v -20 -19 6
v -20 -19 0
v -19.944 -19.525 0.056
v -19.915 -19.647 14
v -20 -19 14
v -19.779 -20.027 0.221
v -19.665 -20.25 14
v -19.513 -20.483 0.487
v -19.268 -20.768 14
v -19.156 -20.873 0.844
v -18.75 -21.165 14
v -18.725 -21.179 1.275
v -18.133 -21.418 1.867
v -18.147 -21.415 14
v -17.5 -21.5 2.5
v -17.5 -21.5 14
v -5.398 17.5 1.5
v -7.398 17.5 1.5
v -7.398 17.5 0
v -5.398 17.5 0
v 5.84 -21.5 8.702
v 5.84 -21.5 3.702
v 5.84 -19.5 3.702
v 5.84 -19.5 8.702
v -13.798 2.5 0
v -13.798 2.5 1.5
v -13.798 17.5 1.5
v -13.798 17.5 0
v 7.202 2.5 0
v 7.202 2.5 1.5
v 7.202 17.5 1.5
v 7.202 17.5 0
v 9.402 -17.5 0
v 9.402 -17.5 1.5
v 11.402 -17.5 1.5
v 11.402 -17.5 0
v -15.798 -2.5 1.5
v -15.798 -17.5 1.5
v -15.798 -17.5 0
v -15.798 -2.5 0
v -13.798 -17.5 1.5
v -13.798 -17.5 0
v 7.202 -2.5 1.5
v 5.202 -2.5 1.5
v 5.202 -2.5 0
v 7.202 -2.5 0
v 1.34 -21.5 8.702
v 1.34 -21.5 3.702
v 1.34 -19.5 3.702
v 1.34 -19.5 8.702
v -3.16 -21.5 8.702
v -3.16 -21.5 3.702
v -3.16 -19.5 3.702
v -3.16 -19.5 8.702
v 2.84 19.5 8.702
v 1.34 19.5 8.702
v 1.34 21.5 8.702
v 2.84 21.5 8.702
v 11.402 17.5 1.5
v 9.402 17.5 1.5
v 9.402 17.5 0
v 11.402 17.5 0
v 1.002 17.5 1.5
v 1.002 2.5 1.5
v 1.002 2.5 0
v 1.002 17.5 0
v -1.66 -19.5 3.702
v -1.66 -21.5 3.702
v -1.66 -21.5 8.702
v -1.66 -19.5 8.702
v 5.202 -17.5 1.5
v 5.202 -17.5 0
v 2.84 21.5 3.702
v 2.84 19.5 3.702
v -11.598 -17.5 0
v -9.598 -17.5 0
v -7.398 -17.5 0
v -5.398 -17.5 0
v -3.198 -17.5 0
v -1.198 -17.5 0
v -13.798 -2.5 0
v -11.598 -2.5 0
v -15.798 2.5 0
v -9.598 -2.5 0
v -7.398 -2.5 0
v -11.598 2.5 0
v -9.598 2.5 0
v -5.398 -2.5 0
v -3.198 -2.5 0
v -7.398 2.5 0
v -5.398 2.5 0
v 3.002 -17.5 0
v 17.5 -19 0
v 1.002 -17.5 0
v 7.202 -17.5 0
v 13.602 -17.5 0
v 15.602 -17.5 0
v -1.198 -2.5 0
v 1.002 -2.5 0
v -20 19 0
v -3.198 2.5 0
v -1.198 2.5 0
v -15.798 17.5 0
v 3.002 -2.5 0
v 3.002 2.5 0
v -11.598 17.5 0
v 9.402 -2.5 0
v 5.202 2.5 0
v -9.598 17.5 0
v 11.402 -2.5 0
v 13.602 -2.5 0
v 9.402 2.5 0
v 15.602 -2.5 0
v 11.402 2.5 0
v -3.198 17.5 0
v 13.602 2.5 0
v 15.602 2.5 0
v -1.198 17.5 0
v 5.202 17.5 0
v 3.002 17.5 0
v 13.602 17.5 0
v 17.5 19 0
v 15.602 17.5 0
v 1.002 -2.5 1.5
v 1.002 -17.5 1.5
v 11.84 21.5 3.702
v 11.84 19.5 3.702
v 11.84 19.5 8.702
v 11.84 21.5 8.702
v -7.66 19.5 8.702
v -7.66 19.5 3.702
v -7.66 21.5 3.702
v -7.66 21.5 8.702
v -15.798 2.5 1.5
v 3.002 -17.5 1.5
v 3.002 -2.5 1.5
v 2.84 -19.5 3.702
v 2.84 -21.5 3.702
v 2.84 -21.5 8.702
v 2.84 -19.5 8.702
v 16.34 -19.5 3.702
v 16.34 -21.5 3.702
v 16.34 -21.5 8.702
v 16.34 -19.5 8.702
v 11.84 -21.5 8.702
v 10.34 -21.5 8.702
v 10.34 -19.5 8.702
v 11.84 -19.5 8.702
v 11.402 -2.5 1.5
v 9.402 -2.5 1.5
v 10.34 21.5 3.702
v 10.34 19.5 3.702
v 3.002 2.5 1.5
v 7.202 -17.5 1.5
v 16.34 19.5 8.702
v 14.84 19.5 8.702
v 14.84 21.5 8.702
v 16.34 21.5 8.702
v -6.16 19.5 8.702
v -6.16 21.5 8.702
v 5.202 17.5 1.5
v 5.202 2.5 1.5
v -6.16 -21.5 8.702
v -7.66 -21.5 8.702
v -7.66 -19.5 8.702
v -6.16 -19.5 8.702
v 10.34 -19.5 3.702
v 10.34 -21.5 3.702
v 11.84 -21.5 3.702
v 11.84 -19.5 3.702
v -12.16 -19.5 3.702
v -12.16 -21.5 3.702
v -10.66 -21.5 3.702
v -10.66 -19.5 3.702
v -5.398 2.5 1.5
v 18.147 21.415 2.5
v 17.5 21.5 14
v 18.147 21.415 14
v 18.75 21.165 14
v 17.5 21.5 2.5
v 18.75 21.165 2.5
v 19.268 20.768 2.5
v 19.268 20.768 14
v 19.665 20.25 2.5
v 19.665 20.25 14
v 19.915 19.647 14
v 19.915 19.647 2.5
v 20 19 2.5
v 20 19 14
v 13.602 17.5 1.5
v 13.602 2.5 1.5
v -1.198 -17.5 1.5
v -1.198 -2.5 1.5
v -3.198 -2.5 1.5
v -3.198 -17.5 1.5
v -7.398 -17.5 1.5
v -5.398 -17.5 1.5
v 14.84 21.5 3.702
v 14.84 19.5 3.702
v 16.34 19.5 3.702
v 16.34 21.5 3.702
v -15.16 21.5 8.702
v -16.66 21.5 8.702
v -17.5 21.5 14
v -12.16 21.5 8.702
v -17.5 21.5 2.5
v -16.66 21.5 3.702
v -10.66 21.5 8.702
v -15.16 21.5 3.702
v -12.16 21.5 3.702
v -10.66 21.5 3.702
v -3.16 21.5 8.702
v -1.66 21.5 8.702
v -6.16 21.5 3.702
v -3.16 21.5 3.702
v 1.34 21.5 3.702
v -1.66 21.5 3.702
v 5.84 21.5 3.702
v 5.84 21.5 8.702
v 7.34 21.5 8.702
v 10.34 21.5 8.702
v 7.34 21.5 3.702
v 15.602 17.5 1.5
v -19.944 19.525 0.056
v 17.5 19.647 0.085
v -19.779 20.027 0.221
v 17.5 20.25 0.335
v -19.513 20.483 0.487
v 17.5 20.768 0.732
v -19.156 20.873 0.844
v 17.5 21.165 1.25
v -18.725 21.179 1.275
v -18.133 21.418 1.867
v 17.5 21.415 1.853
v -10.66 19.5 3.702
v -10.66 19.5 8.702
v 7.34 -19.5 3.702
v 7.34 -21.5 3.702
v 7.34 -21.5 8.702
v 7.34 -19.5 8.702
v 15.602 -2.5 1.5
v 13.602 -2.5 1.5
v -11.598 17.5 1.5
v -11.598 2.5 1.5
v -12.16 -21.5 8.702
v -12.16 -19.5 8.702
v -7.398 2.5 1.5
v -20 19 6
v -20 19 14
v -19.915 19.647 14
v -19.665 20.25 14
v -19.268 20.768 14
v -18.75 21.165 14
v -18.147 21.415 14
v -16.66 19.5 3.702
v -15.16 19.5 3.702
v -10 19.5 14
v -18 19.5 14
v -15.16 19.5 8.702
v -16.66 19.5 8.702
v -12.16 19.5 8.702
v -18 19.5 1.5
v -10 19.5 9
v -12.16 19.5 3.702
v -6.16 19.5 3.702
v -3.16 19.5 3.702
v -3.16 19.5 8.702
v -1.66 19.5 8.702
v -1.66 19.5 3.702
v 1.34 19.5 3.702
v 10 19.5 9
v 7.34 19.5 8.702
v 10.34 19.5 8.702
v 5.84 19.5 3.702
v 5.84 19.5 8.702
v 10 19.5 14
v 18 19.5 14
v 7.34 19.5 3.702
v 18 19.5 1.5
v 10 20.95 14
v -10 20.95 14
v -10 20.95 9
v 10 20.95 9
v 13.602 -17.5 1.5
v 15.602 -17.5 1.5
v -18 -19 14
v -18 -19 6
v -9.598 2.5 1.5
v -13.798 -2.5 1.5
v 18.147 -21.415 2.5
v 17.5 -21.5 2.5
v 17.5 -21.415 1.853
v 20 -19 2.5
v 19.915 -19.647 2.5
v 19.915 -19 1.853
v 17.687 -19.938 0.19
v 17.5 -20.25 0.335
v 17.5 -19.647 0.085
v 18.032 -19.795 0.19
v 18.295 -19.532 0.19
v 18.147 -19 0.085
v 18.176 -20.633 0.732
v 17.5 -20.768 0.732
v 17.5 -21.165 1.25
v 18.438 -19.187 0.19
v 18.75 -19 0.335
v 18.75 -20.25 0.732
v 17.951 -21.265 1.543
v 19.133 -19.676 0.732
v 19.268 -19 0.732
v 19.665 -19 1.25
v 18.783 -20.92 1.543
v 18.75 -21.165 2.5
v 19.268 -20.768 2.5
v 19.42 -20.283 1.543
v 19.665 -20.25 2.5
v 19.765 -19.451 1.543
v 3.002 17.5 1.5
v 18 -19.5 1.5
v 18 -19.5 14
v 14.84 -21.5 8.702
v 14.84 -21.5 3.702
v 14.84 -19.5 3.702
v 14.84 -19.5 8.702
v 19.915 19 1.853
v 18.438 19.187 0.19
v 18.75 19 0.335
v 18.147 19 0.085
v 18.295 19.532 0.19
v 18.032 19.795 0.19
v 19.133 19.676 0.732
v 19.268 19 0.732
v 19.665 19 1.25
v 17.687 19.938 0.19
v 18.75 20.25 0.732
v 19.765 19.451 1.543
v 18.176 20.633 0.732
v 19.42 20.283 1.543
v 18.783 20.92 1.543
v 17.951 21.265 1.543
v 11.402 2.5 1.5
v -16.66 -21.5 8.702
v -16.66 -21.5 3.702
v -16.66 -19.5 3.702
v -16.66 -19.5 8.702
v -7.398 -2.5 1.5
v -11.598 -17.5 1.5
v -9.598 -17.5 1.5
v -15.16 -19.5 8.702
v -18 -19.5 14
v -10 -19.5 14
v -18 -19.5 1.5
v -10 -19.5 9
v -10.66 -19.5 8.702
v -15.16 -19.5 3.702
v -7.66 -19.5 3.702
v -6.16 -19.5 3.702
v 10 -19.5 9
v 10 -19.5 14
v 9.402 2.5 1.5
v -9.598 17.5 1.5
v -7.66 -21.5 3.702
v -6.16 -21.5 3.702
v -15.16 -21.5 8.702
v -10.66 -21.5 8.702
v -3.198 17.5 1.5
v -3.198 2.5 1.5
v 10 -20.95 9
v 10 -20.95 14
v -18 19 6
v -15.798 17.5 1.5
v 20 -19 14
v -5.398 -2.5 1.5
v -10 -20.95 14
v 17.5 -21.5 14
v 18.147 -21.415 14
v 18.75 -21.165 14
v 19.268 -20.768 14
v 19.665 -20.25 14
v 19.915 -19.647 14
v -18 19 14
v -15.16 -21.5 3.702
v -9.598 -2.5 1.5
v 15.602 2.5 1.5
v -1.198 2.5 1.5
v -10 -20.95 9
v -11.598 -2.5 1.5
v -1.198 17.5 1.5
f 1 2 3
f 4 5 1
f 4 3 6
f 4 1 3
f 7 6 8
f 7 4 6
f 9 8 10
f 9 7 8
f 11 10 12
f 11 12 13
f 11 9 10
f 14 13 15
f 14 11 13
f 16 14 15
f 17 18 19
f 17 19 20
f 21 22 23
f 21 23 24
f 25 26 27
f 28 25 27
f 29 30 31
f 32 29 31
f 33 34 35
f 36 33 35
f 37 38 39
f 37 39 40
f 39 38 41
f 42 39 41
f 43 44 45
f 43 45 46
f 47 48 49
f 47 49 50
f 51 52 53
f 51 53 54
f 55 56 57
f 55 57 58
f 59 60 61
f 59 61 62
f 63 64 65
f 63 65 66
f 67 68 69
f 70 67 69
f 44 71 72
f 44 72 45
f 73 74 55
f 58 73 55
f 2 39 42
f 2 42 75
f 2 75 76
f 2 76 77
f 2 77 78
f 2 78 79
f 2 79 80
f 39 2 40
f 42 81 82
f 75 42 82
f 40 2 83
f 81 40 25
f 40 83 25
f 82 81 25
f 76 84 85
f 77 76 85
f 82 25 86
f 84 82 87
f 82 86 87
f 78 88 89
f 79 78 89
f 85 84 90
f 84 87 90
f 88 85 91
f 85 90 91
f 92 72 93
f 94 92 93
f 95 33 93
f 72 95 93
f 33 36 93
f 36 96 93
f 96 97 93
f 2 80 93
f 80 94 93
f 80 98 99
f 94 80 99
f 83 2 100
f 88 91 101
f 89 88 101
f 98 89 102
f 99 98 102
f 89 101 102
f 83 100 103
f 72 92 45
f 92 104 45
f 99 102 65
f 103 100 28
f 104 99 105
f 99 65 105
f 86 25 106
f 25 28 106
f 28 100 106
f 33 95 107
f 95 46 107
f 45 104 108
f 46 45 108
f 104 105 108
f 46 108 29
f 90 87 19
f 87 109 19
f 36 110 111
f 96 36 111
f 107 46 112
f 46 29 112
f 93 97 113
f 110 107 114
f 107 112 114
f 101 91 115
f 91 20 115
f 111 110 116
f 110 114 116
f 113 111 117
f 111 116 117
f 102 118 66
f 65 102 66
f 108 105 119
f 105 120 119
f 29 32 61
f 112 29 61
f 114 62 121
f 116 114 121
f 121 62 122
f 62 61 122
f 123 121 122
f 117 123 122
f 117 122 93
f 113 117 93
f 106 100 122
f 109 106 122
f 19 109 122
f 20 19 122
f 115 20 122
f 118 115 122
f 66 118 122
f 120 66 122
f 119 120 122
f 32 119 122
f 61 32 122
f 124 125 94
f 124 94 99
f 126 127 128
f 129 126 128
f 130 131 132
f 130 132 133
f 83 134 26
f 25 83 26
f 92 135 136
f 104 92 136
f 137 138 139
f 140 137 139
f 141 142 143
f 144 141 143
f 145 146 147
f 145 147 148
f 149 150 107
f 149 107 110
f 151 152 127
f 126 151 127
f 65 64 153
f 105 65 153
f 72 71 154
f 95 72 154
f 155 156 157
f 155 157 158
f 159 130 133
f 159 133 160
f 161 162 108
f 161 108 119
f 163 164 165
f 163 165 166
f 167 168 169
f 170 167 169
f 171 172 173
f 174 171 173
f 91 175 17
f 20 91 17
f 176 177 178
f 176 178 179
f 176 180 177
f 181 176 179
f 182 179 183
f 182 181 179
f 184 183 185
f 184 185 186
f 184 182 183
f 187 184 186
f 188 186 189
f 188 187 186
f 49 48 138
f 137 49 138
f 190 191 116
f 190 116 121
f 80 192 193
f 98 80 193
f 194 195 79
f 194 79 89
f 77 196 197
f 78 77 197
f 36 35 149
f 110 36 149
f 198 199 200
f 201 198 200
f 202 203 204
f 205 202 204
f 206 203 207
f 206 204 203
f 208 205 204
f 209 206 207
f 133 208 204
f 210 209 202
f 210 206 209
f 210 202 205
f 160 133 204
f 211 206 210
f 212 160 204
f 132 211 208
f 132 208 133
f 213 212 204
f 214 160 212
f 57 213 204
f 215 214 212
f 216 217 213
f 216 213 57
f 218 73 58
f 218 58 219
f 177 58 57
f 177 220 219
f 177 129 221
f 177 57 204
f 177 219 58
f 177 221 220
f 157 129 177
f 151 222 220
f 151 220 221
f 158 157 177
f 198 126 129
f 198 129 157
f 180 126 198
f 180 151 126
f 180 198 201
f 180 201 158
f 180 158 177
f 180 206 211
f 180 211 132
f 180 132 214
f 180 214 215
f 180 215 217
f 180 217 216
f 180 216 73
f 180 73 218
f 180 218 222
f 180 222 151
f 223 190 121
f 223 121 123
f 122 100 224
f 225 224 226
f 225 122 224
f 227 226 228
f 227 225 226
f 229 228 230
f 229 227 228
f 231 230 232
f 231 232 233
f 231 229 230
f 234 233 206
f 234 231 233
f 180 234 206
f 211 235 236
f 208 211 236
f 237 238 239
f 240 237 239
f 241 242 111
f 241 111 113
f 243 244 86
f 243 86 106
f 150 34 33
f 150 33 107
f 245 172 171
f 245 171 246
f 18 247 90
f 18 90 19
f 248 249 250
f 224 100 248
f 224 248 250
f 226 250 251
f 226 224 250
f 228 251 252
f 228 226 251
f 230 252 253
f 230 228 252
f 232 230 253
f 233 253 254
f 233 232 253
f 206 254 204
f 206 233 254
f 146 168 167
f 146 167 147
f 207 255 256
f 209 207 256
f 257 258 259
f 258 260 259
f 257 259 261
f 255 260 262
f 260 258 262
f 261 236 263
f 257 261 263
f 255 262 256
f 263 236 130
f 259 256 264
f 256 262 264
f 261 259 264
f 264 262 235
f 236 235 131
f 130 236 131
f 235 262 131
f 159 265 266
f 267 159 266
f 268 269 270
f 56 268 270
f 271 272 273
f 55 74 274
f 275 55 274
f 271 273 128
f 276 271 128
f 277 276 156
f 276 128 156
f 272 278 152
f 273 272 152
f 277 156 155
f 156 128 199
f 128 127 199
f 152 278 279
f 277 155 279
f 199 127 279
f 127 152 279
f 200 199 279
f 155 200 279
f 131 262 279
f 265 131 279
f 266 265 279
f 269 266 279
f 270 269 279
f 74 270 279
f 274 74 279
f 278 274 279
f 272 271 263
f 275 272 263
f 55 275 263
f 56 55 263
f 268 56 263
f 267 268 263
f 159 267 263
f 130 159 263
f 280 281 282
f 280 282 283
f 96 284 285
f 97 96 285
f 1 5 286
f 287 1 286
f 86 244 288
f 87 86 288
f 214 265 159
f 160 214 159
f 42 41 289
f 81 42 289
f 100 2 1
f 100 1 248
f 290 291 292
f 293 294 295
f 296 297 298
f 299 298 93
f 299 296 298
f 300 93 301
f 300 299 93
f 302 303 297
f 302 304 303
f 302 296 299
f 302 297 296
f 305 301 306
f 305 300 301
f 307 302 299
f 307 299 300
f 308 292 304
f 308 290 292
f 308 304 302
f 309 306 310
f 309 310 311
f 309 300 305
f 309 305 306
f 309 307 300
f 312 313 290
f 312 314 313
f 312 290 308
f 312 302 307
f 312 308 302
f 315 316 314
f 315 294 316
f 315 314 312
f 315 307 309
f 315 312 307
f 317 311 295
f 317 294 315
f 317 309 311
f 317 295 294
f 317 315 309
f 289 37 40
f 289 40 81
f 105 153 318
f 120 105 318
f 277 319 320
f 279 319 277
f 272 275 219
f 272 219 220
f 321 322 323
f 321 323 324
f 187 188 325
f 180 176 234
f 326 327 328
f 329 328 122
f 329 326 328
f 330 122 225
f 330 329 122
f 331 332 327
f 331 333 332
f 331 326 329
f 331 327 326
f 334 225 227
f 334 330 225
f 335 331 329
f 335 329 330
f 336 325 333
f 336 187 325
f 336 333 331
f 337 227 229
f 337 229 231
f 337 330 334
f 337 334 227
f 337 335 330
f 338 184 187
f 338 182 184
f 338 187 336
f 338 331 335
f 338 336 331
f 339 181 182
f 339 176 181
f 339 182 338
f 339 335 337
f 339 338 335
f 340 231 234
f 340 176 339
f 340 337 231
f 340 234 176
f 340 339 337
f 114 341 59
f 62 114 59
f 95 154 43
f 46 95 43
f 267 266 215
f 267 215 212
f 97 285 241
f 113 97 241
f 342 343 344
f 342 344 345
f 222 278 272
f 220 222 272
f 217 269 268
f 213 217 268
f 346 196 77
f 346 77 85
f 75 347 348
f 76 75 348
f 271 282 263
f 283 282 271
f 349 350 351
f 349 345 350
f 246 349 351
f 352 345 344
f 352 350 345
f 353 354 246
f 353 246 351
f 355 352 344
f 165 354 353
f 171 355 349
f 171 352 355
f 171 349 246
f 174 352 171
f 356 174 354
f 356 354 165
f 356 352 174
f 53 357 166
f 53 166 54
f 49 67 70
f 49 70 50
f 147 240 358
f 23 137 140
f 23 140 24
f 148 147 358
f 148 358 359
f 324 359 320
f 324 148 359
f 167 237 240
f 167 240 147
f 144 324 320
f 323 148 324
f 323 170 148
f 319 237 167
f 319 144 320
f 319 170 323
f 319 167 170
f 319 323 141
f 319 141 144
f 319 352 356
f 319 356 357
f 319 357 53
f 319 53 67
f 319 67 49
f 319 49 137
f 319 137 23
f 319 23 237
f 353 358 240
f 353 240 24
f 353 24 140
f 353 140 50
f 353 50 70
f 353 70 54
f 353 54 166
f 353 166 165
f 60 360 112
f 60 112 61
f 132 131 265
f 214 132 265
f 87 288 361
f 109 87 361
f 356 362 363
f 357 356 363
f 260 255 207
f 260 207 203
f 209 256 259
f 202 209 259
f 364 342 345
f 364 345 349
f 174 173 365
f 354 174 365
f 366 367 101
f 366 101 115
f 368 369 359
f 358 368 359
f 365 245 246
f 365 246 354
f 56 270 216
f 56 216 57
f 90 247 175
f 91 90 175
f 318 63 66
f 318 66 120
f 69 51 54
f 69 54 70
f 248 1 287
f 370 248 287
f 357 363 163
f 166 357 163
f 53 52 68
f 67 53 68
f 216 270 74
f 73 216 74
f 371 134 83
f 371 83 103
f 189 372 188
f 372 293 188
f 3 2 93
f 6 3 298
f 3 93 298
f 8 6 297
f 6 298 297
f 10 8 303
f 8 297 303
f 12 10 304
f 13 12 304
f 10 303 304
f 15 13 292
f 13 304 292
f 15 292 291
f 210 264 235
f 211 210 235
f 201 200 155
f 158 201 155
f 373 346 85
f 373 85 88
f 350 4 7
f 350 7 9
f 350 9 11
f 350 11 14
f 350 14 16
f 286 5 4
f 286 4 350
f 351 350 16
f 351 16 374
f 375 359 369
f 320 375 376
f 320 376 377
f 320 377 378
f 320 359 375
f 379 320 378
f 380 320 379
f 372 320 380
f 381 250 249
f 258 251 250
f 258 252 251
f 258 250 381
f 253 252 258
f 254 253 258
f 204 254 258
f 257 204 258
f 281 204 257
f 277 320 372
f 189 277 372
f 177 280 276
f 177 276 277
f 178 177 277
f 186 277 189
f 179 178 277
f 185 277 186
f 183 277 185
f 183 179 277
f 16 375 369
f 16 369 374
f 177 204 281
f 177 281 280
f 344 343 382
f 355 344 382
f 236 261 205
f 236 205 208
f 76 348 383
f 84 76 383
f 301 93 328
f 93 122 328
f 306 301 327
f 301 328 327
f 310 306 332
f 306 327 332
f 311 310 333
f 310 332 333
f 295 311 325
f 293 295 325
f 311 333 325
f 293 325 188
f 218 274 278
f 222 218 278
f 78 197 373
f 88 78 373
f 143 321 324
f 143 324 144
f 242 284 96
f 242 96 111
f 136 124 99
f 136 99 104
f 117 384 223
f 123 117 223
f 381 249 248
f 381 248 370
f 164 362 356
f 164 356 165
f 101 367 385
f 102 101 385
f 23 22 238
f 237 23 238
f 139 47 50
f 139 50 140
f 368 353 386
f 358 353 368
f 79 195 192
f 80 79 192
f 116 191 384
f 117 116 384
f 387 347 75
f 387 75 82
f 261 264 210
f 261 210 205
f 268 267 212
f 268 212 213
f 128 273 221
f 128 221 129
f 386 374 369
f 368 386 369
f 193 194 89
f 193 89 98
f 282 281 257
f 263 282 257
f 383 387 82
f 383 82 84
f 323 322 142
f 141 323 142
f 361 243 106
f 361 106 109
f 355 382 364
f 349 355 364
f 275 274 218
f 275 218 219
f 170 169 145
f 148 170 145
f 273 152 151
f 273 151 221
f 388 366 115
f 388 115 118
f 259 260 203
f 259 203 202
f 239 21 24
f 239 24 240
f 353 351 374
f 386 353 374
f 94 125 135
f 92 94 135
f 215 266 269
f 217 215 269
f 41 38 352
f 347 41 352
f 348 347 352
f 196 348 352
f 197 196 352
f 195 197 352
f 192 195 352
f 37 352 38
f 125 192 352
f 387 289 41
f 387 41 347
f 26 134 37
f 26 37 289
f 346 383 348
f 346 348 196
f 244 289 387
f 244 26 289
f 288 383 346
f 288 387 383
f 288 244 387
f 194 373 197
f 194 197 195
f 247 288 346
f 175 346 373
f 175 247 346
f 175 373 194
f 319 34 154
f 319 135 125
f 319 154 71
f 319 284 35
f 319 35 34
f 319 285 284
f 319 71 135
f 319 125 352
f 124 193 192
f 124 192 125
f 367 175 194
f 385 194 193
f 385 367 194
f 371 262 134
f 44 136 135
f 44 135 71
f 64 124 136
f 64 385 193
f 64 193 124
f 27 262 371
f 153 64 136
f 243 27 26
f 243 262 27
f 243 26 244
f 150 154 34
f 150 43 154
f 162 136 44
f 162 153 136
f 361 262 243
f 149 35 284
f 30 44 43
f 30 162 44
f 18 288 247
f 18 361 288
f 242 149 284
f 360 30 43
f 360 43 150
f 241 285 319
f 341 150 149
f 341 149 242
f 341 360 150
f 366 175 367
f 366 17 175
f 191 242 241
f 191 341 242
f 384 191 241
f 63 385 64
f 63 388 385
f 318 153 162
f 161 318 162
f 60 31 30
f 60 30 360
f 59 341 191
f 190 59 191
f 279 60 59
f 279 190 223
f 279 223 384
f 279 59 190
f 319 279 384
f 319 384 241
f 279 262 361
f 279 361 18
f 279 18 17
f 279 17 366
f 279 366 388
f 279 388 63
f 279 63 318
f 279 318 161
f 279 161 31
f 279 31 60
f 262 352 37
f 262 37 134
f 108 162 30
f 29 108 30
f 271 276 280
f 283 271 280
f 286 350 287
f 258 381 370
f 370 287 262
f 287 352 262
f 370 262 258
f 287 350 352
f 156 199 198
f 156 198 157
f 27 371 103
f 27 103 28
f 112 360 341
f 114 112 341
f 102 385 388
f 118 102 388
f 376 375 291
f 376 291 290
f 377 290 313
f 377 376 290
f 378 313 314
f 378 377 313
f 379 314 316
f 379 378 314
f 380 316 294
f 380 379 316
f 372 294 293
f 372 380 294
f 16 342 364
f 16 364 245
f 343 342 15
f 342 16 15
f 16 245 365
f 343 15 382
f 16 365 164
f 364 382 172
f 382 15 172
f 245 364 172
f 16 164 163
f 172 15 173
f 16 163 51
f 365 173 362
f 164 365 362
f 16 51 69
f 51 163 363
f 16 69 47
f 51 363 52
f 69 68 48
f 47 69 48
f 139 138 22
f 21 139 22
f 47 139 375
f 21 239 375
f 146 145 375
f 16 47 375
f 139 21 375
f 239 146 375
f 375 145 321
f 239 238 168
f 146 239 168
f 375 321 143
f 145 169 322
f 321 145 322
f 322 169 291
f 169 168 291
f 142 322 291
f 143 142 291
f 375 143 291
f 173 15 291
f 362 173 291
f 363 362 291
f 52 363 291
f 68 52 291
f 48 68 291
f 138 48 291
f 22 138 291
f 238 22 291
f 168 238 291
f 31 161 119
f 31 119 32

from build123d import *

# Parameters (mm, degrees)
F0_W      = 40
F0_H      = 43
F0_W_2    = 36
F0_H_2    = 39
F1_DEPTH  = 1.5
F2_DEPTH  = 14
F3_W      = 2
F3_H      = 38
F4_DEPTH  = 8
F5_R      = 2.5
F6_W      = 20
F6_H      = 0.05
F6_H_2    = 1.45
F7_DEPTH  = 5
F8_W      = 2
F8_H      = 15
F9_DEPTH  = 25
F10_W     = 1.5
F10_H     = 5
F11_DEPTH = 50


with BuildPart() as f1:
    # F0 (on Top) → F1 (new body)
    with BuildSketch(Plane.XY):
        Rectangle(F0_W, F0_H)
        Rectangle(F0_W_2, F0_H_2, mode=Mode.SUBTRACT)
        Rectangle(F0_W_2, F0_H_2)
    extrude(amount=F1_DEPTH)

    # F0 (on Top) → F2 (join)
    with BuildSketch(Plane.XY):
        Rectangle(F0_W, F0_H)
        Rectangle(F0_W_2, F0_H_2, mode=Mode.SUBTRACT)
    extrude(amount=F2_DEPTH)

    # F3 (on face) → F4 (cut)
    with BuildSketch(Plane.XY.offset(14)):
        with Locations((-19, 0)):
            Rectangle(F3_W, F3_H)
    extrude(amount=-F4_DEPTH, mode=Mode.SUBTRACT)

    # F5
    f5_edges = [f1.edges().sort_by_distance(p)[0] for p in [
        (-20, -21.5, 7),
        (20, -21.5, 7),
        (20, 21.5, 7),
        (-20, 21.5, 7),
        (0, -21.5, 0),
        (20, 0, 0),
        (0, 21.5, 0),
    ]]
    fillet(f5_edges, radius=F5_R)

    # F6 (on face) → F7 (cut)
    with BuildSketch(Plane.XY.offset(14)):
        with Locations((0, 19.475)):
            Rectangle(F6_W, F6_H)
        with Locations((0, -19.475)):
            Rectangle(F6_W, F6_H)
        with Locations((0, -20.225)):
            Rectangle(F6_W, F6_H_2)
        with Locations((0, 20.225)):
            Rectangle(F6_W, F6_H_2)
    extrude(amount=-F7_DEPTH, mode=Mode.SUBTRACT)

    # F8 (on face) → F9 (cut)
    with BuildSketch(Plane.XY.offset(1.5)):
        with Locations((-14.7980369404, 9.9996174034)):
            Rectangle(F8_W, F8_H)
        with Locations((-14.7980369404, -9.9996174034)):
            Rectangle(F8_W, F8_H)
        with Locations((-10.5980369404, 9.9996174034)):
            Rectangle(F8_W, F8_H)
        with Locations((-10.5980369404, -9.9996174034)):
            Rectangle(F8_W, F8_H)
        with Locations((-6.3980369404, 9.9996174034)):
            Rectangle(F8_W, F8_H)
        with Locations((-6.3980369404, -9.9996174034)):
            Rectangle(F8_W, F8_H)
        with Locations((-2.1980369404, 9.9996174034)):
            Rectangle(F8_W, F8_H)
        with Locations((-2.1980369404, -9.9996174034)):
            Rectangle(F8_W, F8_H)
        with Locations((2.0019630596, 9.9996174034)):
            Rectangle(F8_W, F8_H)
        with Locations((2.0019630596, -9.9996174034)):
            Rectangle(F8_W, F8_H)
        with Locations((6.2019630596, 9.9996174034)):
            Rectangle(F8_W, F8_H)
        with Locations((6.2019630596, -9.9996174034)):
            Rectangle(F8_W, F8_H)
        with Locations((10.4019630596, 9.9996174034)):
            Rectangle(F8_W, F8_H)
        with Locations((10.4019630596, -9.9996174034)):
            Rectangle(F8_W, F8_H)
        with Locations((14.6019630596, 9.9996174034)):
            Rectangle(F8_W, F8_H)
        with Locations((14.6019630596, -9.9996174034)):
            Rectangle(F8_W, F8_H)
    extrude(amount=-F9_DEPTH, mode=Mode.SUBTRACT)

    # F10 (on face) → F11 (cut)
    with BuildSketch(Plane.XZ.offset(21.5)):
        with Locations((-15.9102423415, 6.201856127)):
            Rectangle(F10_W, F10_H)
        with Locations((-11.4102423415, 6.201856127)):
            Rectangle(F10_W, F10_H)
        with Locations((-6.9102423415, 6.201856127)):
            Rectangle(F10_W, F10_H)
        with Locations((-2.4102423415, 6.201856127)):
            Rectangle(F10_W, F10_H)
        with Locations((2.0897576585, 6.201856127)):
            Rectangle(F10_W, F10_H)
        with Locations((6.5897576585, 6.201856127)):
            Rectangle(F10_W, F10_H)
        with Locations((11.0897576585, 6.201856127)):
            Rectangle(F10_W, F10_H)
        with Locations((15.5897576585, 6.201856127)):
            Rectangle(F10_W, F10_H)
    extrude(amount=-F11_DEPTH, mode=Mode.SUBTRACT)


solid = f1.part
